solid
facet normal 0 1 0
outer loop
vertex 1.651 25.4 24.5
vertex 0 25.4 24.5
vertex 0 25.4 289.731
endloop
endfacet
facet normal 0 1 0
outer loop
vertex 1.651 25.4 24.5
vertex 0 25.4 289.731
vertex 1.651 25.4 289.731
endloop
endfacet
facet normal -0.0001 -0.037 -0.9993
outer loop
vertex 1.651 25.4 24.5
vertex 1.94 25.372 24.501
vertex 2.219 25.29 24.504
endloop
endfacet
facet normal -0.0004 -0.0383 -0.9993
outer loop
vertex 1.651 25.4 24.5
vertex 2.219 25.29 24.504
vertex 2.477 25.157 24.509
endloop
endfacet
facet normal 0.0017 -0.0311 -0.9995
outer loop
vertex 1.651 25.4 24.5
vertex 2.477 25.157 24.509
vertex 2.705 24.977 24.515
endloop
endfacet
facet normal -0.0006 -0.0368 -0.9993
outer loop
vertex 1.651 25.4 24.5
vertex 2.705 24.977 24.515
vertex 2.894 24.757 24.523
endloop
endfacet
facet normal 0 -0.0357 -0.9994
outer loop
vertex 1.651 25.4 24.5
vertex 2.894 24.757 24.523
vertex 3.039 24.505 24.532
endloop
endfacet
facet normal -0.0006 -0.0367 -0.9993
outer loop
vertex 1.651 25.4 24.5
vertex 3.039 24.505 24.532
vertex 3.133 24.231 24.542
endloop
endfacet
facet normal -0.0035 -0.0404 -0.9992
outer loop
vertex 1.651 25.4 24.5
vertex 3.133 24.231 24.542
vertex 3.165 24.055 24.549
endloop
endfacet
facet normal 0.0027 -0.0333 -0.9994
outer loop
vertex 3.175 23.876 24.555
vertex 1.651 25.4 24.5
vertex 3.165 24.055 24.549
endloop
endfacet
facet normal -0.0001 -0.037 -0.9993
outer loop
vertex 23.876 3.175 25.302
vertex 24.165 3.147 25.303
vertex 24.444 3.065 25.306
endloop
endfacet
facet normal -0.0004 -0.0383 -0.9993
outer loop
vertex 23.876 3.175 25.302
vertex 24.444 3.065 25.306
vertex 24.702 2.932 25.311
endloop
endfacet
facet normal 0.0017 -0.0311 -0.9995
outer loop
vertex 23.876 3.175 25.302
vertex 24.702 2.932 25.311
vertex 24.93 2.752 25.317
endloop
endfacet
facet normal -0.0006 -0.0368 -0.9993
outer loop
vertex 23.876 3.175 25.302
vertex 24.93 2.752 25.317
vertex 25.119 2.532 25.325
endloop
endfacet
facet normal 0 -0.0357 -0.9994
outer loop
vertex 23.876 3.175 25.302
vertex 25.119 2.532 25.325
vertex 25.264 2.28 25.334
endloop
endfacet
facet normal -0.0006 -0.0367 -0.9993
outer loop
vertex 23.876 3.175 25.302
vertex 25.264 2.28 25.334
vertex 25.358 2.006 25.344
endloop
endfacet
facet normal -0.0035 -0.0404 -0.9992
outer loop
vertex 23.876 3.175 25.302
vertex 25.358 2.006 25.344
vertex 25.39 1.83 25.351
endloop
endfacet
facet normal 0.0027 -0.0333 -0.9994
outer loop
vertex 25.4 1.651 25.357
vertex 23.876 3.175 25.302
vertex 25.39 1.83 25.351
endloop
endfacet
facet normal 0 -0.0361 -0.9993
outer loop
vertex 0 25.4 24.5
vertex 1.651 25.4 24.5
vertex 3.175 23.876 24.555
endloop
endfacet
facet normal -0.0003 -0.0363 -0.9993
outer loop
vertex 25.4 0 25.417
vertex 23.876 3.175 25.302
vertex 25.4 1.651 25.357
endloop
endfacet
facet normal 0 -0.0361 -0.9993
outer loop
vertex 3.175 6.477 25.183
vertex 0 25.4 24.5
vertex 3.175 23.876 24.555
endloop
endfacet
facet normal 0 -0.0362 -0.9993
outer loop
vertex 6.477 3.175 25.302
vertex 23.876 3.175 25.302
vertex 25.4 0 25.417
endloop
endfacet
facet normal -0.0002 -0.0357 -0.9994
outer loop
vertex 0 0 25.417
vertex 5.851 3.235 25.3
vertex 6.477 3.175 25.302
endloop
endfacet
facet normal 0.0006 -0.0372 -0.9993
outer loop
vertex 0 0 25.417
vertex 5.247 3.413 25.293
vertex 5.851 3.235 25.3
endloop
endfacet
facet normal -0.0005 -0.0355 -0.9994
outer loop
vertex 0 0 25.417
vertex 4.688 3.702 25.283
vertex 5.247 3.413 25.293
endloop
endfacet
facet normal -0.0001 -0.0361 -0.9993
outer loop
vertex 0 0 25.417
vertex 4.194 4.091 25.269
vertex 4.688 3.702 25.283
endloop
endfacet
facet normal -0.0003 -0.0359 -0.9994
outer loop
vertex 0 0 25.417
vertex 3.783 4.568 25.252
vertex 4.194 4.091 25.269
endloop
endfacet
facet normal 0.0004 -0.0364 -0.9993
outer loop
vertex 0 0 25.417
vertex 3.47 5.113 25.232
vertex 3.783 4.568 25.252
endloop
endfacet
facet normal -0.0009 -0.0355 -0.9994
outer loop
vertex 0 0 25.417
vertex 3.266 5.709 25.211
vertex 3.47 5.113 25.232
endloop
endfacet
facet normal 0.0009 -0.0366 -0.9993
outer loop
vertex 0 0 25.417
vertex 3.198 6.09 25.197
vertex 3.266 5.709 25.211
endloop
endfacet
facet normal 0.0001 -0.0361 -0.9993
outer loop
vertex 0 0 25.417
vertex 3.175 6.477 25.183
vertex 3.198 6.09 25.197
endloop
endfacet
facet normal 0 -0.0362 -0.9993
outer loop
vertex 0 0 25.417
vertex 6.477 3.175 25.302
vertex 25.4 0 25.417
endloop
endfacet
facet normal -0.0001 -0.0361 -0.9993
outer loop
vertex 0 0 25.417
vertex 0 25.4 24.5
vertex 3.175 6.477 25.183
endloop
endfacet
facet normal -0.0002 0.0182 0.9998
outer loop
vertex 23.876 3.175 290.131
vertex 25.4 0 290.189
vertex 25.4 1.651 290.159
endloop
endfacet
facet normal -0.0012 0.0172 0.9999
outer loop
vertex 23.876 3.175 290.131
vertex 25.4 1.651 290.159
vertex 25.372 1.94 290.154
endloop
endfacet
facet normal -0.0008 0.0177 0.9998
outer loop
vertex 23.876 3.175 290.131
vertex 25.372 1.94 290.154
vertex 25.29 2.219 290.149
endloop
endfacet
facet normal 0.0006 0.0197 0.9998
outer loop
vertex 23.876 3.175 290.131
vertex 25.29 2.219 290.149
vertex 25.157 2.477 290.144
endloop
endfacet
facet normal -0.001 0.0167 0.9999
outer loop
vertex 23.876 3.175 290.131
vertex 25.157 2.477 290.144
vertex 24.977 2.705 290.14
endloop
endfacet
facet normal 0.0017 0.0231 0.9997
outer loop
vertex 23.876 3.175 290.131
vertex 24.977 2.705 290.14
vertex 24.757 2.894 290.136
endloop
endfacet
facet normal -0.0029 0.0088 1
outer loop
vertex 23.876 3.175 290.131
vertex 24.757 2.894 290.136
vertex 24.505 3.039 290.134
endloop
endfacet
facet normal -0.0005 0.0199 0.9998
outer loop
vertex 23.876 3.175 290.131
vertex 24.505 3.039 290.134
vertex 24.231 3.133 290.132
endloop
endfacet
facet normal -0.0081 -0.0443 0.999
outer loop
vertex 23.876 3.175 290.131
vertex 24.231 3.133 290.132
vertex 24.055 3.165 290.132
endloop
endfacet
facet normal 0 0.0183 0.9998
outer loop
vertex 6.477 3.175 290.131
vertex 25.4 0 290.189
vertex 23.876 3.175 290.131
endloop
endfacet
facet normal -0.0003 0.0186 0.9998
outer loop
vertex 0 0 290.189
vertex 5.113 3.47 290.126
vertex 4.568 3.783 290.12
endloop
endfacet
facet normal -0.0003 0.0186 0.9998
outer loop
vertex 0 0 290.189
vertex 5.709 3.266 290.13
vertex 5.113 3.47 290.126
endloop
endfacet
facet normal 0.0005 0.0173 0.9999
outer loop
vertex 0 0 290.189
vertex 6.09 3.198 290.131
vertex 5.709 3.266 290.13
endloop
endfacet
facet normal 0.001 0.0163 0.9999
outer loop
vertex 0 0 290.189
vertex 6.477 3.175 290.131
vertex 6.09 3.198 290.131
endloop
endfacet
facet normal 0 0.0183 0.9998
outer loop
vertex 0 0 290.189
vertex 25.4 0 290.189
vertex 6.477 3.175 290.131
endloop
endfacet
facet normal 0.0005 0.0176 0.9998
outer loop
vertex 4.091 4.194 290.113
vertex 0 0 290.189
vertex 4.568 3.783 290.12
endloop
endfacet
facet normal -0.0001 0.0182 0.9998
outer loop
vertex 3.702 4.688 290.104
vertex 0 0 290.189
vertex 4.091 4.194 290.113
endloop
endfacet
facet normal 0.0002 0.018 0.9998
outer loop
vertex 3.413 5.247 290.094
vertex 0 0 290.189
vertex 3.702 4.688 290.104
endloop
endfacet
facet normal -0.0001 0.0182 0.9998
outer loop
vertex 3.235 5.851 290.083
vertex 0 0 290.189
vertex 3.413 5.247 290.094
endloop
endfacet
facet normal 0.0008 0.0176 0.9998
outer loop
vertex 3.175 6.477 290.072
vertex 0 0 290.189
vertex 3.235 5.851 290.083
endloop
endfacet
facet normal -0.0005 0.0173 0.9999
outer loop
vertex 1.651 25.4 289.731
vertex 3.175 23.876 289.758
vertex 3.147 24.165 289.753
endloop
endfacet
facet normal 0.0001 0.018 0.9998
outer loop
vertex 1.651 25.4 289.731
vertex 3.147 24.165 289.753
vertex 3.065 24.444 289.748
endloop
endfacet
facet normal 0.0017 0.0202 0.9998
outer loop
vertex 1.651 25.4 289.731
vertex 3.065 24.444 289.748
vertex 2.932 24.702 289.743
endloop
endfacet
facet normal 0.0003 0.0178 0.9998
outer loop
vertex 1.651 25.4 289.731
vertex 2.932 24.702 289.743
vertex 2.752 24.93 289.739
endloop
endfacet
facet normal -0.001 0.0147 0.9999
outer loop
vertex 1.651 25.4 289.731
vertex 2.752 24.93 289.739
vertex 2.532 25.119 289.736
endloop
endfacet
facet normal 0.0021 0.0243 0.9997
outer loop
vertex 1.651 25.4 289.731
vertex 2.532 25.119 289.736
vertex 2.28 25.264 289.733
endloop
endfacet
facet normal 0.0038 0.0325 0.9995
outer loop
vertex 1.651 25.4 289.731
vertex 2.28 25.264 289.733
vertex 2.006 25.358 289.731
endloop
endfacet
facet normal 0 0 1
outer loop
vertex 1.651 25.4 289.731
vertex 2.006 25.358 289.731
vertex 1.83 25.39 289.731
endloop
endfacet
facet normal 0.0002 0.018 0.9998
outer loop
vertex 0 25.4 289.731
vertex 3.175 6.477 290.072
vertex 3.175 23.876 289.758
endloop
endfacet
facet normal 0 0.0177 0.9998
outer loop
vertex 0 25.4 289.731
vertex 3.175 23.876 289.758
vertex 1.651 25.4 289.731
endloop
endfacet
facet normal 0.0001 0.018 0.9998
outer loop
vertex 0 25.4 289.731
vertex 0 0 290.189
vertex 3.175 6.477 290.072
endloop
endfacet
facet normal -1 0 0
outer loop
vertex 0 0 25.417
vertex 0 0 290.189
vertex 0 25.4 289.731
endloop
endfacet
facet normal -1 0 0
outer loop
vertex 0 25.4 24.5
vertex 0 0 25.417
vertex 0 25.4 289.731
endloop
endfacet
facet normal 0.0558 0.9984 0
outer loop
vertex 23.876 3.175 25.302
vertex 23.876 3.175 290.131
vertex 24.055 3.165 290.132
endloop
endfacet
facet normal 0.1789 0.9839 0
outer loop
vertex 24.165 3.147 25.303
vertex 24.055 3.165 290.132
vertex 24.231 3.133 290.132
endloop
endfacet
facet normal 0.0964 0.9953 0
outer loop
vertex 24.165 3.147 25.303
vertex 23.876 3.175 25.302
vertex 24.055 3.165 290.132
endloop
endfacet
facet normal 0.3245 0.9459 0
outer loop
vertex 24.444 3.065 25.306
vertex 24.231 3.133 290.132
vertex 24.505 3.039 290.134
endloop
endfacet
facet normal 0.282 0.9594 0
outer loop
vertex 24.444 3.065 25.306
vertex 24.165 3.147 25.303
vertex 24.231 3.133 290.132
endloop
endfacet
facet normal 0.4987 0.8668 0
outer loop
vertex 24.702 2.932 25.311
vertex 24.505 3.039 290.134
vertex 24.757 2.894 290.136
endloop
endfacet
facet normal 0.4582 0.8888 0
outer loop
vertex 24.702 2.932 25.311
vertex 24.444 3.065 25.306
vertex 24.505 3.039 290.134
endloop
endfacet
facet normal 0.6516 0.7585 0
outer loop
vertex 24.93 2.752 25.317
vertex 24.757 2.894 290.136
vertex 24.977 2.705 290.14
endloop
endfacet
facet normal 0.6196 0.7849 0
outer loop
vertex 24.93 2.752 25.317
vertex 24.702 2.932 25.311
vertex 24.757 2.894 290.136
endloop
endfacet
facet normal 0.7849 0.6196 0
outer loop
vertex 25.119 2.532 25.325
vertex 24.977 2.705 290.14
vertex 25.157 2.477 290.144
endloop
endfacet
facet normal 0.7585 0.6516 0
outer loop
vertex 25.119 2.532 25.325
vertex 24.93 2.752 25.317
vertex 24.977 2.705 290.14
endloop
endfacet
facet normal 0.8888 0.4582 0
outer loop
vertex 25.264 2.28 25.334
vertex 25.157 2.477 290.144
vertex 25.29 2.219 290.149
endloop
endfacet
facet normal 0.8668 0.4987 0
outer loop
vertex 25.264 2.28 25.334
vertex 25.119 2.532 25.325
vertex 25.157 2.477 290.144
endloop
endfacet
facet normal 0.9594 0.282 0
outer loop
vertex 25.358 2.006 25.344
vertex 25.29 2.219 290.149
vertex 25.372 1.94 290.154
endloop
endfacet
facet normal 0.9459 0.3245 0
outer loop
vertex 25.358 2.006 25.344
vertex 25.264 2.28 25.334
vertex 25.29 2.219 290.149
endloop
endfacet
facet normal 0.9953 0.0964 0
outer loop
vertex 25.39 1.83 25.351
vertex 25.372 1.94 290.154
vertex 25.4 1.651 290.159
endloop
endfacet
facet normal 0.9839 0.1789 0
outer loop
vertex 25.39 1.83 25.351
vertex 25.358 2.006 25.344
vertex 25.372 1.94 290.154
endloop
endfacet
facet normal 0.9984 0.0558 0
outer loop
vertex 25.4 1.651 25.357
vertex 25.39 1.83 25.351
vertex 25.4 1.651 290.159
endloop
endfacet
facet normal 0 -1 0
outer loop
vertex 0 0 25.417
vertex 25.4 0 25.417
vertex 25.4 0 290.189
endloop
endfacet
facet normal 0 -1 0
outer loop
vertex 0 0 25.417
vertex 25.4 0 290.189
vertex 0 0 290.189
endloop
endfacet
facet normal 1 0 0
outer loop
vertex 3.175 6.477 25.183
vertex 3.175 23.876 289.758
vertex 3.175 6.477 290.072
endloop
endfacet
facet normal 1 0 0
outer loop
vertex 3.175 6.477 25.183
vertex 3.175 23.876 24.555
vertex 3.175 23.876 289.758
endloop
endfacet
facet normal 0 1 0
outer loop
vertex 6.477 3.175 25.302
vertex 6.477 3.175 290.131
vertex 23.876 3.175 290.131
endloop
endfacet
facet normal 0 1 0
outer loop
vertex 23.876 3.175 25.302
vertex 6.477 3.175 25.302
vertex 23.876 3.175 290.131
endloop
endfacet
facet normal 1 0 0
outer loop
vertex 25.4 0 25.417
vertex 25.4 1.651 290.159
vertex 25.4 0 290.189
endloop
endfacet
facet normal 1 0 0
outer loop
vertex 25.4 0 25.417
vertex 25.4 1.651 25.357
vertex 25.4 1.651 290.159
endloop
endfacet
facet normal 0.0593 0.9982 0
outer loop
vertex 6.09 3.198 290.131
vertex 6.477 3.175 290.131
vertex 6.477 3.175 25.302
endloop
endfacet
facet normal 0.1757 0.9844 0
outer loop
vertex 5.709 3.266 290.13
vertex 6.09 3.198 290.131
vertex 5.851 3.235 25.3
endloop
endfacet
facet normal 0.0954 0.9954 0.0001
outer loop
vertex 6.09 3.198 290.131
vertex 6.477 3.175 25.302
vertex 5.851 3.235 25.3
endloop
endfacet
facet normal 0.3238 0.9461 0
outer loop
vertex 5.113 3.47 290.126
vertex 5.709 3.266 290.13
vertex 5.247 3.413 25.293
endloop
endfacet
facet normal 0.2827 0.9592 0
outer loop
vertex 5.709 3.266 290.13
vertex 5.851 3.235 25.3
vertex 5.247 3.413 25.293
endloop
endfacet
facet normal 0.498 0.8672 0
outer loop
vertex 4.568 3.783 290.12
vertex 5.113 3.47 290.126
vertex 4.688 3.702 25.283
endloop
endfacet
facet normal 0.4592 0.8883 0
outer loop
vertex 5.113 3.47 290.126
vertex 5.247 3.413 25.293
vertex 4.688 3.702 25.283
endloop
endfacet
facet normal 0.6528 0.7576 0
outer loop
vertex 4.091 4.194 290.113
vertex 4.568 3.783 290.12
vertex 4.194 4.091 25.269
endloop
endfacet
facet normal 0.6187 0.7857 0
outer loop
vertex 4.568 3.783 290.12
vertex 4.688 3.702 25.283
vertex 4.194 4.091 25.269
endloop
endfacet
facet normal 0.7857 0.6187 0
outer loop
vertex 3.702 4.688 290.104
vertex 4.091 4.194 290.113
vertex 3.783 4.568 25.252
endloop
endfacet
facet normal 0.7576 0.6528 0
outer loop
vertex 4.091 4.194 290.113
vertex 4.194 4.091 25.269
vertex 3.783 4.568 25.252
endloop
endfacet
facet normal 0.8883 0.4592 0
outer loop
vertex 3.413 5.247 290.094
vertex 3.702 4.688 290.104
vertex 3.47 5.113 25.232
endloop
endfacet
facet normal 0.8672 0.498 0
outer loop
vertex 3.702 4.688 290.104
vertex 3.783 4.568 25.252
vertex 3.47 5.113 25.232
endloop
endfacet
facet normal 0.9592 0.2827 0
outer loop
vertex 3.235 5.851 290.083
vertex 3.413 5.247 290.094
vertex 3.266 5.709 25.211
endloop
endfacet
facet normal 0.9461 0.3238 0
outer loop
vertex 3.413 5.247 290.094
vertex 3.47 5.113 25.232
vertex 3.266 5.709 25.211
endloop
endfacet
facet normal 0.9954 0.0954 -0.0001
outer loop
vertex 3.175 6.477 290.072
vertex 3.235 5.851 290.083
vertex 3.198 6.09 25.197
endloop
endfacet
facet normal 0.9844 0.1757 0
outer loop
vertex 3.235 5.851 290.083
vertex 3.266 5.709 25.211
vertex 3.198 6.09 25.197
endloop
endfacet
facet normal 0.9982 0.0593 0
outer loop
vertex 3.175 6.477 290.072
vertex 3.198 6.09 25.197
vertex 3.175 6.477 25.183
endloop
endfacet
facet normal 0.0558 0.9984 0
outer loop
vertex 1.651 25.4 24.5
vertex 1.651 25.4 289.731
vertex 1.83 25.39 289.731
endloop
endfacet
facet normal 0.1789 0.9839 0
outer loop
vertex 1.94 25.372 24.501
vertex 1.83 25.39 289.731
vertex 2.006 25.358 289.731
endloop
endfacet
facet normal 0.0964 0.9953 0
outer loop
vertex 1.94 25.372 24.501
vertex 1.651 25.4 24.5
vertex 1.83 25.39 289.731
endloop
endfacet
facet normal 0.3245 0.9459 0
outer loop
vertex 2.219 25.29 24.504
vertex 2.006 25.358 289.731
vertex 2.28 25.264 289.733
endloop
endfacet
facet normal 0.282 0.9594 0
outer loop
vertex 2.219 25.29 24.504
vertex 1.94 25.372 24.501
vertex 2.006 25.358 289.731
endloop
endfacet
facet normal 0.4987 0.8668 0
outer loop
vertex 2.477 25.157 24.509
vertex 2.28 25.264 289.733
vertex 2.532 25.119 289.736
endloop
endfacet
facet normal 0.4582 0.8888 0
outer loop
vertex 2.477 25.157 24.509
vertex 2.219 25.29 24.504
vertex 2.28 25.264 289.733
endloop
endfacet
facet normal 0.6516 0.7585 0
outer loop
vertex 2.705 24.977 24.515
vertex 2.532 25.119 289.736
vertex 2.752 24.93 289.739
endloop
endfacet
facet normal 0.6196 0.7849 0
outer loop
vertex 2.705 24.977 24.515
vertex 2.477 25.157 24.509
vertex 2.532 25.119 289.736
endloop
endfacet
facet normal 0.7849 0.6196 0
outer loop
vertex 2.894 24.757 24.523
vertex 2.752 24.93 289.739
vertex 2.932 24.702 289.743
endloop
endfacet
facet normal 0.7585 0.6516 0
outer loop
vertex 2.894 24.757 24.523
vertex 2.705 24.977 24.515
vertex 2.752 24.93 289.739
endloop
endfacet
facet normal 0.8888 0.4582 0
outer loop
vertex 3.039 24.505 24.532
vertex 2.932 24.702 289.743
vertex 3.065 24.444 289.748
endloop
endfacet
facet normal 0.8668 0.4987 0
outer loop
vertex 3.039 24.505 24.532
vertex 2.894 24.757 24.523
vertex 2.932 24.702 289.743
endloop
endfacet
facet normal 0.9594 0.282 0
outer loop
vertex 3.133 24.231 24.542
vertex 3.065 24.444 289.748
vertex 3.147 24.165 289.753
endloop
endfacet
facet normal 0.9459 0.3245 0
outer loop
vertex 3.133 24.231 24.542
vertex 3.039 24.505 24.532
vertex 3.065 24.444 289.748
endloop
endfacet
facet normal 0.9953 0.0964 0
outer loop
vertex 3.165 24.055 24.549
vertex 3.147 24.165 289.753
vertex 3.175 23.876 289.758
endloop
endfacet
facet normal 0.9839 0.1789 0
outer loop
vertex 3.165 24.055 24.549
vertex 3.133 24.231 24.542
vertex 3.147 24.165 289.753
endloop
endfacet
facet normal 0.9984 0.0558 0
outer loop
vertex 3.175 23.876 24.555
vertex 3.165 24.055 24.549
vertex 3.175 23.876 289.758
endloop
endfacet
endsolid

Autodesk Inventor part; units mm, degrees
ref_plane "Start Plane" through (0, 0, 24.5) normal (0, 0, 1) x (1, 0, 0)
ref_plane "End Plane" through (0, 0, 290.1887) normal (0, 0, 1) x (1, 0, 0)
sketch "Sketch" plane through (0, 0, 0) normal (0, 0, 1) x (1, 0, 0)
  line L0 (25.4, 0) -> (0, 0)
  line L1 (0, 0) -> (0, 25.4)
  line L2 (0, 25.4) -> (1.651, 25.4)
  line L3 (3.175, 23.876) -> (3.175, 6.477)
  line L4 (6.477, 3.175) -> (23.876, 3.175)
  line L5 (25.4, 1.651) -> (25.4, 0)
  line L6 (0, -11.0414) -> (0, 31.5385) construction
  line L7 (-11.0414, 0) -> (31.5385, 0) construction
  arc A0 (3.175, 6.477) -> (6.477, 3.175) centre (6.477, 6.477) ccw
  arc A1 (3.175, 23.876) -> (1.651, 25.4) centre (1.651, 23.876) ccw
  arc A2 (25.4, 1.651) -> (23.876, 3.175) centre (23.876, 1.651) ccw
  line L8 (0, 40.0545) -> (0, -19.5574) construction
  line L9 (-19.5574, 0) -> (40.0545, 0) construction
  point P0 (3.175, 25.4)
  point P1 (3.175, 3.175)
  point P2 (25.4, 3.175)
  dimension "d0" = 25.4
  dimension "d1" = 25.4
  dimension "d2" = 3.175
  dimension "d3" = 3.175
  dimension "d10" = 0
  dimension "d11" = 0
  dimension "d14" = 3.302
  dimension "d15" = 1.524
extrude "Body" add sketch "Sketch" along normal up to surface (265.6887 mm away) from surface at 24.5
sketch "Sketch3" plane through (0, 0, 0) normal (0, 0, 1) x (1, 0, 0)
  line L0 (0, 0) -> (10, 0)
ref_plane "Work Plane3" through (0, 0, 0) normal (0, -1, 0) x (1, 0, 0)
ref_plane "Work Plane4" through (12.7, 0, 290.1887) normal (0, 0.0180324, 0.9998374) x (1, 0, 0)
split "Split1" plane through (12.7, 0, 290.1887) removes the side toward (0, 0.0180324, 0.9998374)
ref_plane "Work Plane9" through (690, 1039.3123, -12.0844) normal (0, -0.036059, -0.9993497) x (1, 0, 0)
split "Split3" plane through (690, 1039.3123, -12.0844) removes the side toward (0, -0.036059, -0.9993497)
sketch "Sketch4" plane through (0, 0, 0) normal (0, -1, 0) x (1, 0, 0)
  line L0 (-2, 24.5) -> (12, 24.5) projected
  line L1 (-2, 290.1887) -> (12, 290.1887) projected
  dimension "d17" = 265.6887
equation "\"d0\" = G_H"
equation "\"d1\" = G_H"
equation "\"d2\" = G_T"
equation "\"d3\" = G_T"
equation "\"d14\" = G_IR"
equation "\"d15\" = G_ER"
equation "\"d4\" = G_L"
equation "\"G_H\" = 25.4"
equation "\"G_T\" = 3.175"
equation "\"G_ER\" = 1.524"
equation "\"G_IR\" = 3.302"
equation "\"G_L\" = 265.68959"
equation "\"ex\" = 0"
equation "\"G_OFFSET_START\" = -24.50003"
equation "\"G_OFFSET_END\" = 0"
equation "\"d12\" = -G_OFFSET_START"
equation "\"d13\" = G_OFFSET_END + B_L"
equation "\"B_L\" = 290.18872"
properties part number "AISC - L 1 x 1 x 1/8 - 10.46" material "Steel, Mild"
